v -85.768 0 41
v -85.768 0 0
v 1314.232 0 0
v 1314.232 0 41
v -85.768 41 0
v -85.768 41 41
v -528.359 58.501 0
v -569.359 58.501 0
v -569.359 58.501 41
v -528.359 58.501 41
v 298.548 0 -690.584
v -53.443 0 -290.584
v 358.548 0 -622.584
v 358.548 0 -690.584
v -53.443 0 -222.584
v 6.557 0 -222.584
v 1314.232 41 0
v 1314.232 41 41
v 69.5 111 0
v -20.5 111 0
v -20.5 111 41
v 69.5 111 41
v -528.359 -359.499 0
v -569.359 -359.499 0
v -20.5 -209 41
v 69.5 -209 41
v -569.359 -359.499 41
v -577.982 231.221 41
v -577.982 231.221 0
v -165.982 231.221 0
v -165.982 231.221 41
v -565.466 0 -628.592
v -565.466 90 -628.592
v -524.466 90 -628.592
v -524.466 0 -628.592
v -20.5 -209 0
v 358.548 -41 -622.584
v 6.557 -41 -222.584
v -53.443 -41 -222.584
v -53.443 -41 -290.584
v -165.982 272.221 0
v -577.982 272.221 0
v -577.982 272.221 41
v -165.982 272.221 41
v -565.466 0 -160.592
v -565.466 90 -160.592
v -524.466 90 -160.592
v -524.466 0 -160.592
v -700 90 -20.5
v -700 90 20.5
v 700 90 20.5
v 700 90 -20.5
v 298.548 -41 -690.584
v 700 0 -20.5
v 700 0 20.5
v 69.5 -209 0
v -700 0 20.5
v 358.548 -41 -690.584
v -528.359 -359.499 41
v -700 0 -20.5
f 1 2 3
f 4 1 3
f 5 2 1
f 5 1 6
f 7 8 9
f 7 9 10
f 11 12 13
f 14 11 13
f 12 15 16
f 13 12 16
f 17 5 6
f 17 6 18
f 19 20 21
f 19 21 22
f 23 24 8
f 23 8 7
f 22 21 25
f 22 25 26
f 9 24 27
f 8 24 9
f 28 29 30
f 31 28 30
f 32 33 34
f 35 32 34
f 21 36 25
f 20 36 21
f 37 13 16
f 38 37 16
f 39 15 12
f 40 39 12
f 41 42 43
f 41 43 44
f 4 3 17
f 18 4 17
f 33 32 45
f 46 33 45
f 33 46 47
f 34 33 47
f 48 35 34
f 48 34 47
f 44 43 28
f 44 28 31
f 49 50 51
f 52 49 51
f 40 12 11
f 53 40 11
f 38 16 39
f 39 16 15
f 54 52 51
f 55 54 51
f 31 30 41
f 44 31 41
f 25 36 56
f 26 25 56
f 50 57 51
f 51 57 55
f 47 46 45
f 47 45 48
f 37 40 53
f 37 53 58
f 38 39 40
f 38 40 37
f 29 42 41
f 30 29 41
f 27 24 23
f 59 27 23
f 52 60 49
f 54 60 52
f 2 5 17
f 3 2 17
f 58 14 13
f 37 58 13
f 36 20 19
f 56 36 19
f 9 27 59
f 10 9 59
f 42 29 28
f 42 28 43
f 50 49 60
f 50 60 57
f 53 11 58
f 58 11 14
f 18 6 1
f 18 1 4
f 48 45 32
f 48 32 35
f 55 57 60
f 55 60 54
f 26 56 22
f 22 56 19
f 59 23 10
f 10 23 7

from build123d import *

# Parameters (mm, degrees)
F0_W      = 1400
F0_H      = 41
F1_DEPTH  = 41
F2_W      = 41
F2_H      = 418
F3_DEPTH  = 41
F4_W      = 41
F4_H      = 468
F5_DEPTH  = 90
F6_W      = 1400
F6_H      = 41
F7_DEPTH  = 90
F8_W      = 90
F8_H      = 320
F9_DEPTH  = 41
F10_W     = 412
F10_H     = 41
F11_DEPTH = 41
F13_DEPTH = 41


with BuildPart() as f1:
    # F0 (on Top) → F1 (new body)
    with BuildSketch(Plane.XY):
        with Locations((614.2315574641, 20.5)):
            Rectangle(F0_W, F0_H)
    extrude(amount=F1_DEPTH)


with BuildPart() as f3:
    # F2 (on Top) → F3 (new body)
    with BuildSketch(Plane.XY):
        with Locations((-548.8585276604, -150.4986073971)):
            Rectangle(F2_W, F2_H)
    extrude(amount=F3_DEPTH)


with BuildPart() as f5:
    # F4 (on Front) → F5 (new body)
    with BuildSketch(Plane.XZ):
        with Locations((-544.9659867287, -394.5916641653)):
            Rectangle(F4_W, F4_H)
    extrude(amount=-F5_DEPTH)


with BuildPart() as f7:
    # F6 (on Front) → F7 (new body)
    with BuildSketch(Plane.XZ):
        Rectangle(F6_W, F6_H)
    extrude(amount=-F7_DEPTH)


with BuildPart() as f9:
    # F8 (on Top) → F9 (new body)
    with BuildSketch(Plane.XY):
        with Locations((24.5, -49)):
            Rectangle(F8_W, F8_H)
    extrude(amount=F9_DEPTH)


with BuildPart() as f11:
    # F10 (on Top) → F11 (new body)
    with BuildSketch(Plane.XY):
        with Locations((-371.981710434, 251.7209606171)):
            Rectangle(F10_W, F10_H)
    extrude(amount=F11_DEPTH)


with BuildPart() as f13:
    # F12 (on Front) → F13 (new body)
    with BuildSketch(Plane.XZ):
        Polygon((-53.4426776367, -222.5840827349), (-53.4426776367, -290.5840827349), (298.5475955244, -690.5840827349), (358.5475955244, -690.5840827349), (358.5475955244, -622.5840827349), (6.5573223633, -222.5840827349), align=None)
    extrude(amount=F13_DEPTH)


solid = Compound([f1.part, f3.part, f5.part, f7.part, f9.part, f11.part, f13.part])
